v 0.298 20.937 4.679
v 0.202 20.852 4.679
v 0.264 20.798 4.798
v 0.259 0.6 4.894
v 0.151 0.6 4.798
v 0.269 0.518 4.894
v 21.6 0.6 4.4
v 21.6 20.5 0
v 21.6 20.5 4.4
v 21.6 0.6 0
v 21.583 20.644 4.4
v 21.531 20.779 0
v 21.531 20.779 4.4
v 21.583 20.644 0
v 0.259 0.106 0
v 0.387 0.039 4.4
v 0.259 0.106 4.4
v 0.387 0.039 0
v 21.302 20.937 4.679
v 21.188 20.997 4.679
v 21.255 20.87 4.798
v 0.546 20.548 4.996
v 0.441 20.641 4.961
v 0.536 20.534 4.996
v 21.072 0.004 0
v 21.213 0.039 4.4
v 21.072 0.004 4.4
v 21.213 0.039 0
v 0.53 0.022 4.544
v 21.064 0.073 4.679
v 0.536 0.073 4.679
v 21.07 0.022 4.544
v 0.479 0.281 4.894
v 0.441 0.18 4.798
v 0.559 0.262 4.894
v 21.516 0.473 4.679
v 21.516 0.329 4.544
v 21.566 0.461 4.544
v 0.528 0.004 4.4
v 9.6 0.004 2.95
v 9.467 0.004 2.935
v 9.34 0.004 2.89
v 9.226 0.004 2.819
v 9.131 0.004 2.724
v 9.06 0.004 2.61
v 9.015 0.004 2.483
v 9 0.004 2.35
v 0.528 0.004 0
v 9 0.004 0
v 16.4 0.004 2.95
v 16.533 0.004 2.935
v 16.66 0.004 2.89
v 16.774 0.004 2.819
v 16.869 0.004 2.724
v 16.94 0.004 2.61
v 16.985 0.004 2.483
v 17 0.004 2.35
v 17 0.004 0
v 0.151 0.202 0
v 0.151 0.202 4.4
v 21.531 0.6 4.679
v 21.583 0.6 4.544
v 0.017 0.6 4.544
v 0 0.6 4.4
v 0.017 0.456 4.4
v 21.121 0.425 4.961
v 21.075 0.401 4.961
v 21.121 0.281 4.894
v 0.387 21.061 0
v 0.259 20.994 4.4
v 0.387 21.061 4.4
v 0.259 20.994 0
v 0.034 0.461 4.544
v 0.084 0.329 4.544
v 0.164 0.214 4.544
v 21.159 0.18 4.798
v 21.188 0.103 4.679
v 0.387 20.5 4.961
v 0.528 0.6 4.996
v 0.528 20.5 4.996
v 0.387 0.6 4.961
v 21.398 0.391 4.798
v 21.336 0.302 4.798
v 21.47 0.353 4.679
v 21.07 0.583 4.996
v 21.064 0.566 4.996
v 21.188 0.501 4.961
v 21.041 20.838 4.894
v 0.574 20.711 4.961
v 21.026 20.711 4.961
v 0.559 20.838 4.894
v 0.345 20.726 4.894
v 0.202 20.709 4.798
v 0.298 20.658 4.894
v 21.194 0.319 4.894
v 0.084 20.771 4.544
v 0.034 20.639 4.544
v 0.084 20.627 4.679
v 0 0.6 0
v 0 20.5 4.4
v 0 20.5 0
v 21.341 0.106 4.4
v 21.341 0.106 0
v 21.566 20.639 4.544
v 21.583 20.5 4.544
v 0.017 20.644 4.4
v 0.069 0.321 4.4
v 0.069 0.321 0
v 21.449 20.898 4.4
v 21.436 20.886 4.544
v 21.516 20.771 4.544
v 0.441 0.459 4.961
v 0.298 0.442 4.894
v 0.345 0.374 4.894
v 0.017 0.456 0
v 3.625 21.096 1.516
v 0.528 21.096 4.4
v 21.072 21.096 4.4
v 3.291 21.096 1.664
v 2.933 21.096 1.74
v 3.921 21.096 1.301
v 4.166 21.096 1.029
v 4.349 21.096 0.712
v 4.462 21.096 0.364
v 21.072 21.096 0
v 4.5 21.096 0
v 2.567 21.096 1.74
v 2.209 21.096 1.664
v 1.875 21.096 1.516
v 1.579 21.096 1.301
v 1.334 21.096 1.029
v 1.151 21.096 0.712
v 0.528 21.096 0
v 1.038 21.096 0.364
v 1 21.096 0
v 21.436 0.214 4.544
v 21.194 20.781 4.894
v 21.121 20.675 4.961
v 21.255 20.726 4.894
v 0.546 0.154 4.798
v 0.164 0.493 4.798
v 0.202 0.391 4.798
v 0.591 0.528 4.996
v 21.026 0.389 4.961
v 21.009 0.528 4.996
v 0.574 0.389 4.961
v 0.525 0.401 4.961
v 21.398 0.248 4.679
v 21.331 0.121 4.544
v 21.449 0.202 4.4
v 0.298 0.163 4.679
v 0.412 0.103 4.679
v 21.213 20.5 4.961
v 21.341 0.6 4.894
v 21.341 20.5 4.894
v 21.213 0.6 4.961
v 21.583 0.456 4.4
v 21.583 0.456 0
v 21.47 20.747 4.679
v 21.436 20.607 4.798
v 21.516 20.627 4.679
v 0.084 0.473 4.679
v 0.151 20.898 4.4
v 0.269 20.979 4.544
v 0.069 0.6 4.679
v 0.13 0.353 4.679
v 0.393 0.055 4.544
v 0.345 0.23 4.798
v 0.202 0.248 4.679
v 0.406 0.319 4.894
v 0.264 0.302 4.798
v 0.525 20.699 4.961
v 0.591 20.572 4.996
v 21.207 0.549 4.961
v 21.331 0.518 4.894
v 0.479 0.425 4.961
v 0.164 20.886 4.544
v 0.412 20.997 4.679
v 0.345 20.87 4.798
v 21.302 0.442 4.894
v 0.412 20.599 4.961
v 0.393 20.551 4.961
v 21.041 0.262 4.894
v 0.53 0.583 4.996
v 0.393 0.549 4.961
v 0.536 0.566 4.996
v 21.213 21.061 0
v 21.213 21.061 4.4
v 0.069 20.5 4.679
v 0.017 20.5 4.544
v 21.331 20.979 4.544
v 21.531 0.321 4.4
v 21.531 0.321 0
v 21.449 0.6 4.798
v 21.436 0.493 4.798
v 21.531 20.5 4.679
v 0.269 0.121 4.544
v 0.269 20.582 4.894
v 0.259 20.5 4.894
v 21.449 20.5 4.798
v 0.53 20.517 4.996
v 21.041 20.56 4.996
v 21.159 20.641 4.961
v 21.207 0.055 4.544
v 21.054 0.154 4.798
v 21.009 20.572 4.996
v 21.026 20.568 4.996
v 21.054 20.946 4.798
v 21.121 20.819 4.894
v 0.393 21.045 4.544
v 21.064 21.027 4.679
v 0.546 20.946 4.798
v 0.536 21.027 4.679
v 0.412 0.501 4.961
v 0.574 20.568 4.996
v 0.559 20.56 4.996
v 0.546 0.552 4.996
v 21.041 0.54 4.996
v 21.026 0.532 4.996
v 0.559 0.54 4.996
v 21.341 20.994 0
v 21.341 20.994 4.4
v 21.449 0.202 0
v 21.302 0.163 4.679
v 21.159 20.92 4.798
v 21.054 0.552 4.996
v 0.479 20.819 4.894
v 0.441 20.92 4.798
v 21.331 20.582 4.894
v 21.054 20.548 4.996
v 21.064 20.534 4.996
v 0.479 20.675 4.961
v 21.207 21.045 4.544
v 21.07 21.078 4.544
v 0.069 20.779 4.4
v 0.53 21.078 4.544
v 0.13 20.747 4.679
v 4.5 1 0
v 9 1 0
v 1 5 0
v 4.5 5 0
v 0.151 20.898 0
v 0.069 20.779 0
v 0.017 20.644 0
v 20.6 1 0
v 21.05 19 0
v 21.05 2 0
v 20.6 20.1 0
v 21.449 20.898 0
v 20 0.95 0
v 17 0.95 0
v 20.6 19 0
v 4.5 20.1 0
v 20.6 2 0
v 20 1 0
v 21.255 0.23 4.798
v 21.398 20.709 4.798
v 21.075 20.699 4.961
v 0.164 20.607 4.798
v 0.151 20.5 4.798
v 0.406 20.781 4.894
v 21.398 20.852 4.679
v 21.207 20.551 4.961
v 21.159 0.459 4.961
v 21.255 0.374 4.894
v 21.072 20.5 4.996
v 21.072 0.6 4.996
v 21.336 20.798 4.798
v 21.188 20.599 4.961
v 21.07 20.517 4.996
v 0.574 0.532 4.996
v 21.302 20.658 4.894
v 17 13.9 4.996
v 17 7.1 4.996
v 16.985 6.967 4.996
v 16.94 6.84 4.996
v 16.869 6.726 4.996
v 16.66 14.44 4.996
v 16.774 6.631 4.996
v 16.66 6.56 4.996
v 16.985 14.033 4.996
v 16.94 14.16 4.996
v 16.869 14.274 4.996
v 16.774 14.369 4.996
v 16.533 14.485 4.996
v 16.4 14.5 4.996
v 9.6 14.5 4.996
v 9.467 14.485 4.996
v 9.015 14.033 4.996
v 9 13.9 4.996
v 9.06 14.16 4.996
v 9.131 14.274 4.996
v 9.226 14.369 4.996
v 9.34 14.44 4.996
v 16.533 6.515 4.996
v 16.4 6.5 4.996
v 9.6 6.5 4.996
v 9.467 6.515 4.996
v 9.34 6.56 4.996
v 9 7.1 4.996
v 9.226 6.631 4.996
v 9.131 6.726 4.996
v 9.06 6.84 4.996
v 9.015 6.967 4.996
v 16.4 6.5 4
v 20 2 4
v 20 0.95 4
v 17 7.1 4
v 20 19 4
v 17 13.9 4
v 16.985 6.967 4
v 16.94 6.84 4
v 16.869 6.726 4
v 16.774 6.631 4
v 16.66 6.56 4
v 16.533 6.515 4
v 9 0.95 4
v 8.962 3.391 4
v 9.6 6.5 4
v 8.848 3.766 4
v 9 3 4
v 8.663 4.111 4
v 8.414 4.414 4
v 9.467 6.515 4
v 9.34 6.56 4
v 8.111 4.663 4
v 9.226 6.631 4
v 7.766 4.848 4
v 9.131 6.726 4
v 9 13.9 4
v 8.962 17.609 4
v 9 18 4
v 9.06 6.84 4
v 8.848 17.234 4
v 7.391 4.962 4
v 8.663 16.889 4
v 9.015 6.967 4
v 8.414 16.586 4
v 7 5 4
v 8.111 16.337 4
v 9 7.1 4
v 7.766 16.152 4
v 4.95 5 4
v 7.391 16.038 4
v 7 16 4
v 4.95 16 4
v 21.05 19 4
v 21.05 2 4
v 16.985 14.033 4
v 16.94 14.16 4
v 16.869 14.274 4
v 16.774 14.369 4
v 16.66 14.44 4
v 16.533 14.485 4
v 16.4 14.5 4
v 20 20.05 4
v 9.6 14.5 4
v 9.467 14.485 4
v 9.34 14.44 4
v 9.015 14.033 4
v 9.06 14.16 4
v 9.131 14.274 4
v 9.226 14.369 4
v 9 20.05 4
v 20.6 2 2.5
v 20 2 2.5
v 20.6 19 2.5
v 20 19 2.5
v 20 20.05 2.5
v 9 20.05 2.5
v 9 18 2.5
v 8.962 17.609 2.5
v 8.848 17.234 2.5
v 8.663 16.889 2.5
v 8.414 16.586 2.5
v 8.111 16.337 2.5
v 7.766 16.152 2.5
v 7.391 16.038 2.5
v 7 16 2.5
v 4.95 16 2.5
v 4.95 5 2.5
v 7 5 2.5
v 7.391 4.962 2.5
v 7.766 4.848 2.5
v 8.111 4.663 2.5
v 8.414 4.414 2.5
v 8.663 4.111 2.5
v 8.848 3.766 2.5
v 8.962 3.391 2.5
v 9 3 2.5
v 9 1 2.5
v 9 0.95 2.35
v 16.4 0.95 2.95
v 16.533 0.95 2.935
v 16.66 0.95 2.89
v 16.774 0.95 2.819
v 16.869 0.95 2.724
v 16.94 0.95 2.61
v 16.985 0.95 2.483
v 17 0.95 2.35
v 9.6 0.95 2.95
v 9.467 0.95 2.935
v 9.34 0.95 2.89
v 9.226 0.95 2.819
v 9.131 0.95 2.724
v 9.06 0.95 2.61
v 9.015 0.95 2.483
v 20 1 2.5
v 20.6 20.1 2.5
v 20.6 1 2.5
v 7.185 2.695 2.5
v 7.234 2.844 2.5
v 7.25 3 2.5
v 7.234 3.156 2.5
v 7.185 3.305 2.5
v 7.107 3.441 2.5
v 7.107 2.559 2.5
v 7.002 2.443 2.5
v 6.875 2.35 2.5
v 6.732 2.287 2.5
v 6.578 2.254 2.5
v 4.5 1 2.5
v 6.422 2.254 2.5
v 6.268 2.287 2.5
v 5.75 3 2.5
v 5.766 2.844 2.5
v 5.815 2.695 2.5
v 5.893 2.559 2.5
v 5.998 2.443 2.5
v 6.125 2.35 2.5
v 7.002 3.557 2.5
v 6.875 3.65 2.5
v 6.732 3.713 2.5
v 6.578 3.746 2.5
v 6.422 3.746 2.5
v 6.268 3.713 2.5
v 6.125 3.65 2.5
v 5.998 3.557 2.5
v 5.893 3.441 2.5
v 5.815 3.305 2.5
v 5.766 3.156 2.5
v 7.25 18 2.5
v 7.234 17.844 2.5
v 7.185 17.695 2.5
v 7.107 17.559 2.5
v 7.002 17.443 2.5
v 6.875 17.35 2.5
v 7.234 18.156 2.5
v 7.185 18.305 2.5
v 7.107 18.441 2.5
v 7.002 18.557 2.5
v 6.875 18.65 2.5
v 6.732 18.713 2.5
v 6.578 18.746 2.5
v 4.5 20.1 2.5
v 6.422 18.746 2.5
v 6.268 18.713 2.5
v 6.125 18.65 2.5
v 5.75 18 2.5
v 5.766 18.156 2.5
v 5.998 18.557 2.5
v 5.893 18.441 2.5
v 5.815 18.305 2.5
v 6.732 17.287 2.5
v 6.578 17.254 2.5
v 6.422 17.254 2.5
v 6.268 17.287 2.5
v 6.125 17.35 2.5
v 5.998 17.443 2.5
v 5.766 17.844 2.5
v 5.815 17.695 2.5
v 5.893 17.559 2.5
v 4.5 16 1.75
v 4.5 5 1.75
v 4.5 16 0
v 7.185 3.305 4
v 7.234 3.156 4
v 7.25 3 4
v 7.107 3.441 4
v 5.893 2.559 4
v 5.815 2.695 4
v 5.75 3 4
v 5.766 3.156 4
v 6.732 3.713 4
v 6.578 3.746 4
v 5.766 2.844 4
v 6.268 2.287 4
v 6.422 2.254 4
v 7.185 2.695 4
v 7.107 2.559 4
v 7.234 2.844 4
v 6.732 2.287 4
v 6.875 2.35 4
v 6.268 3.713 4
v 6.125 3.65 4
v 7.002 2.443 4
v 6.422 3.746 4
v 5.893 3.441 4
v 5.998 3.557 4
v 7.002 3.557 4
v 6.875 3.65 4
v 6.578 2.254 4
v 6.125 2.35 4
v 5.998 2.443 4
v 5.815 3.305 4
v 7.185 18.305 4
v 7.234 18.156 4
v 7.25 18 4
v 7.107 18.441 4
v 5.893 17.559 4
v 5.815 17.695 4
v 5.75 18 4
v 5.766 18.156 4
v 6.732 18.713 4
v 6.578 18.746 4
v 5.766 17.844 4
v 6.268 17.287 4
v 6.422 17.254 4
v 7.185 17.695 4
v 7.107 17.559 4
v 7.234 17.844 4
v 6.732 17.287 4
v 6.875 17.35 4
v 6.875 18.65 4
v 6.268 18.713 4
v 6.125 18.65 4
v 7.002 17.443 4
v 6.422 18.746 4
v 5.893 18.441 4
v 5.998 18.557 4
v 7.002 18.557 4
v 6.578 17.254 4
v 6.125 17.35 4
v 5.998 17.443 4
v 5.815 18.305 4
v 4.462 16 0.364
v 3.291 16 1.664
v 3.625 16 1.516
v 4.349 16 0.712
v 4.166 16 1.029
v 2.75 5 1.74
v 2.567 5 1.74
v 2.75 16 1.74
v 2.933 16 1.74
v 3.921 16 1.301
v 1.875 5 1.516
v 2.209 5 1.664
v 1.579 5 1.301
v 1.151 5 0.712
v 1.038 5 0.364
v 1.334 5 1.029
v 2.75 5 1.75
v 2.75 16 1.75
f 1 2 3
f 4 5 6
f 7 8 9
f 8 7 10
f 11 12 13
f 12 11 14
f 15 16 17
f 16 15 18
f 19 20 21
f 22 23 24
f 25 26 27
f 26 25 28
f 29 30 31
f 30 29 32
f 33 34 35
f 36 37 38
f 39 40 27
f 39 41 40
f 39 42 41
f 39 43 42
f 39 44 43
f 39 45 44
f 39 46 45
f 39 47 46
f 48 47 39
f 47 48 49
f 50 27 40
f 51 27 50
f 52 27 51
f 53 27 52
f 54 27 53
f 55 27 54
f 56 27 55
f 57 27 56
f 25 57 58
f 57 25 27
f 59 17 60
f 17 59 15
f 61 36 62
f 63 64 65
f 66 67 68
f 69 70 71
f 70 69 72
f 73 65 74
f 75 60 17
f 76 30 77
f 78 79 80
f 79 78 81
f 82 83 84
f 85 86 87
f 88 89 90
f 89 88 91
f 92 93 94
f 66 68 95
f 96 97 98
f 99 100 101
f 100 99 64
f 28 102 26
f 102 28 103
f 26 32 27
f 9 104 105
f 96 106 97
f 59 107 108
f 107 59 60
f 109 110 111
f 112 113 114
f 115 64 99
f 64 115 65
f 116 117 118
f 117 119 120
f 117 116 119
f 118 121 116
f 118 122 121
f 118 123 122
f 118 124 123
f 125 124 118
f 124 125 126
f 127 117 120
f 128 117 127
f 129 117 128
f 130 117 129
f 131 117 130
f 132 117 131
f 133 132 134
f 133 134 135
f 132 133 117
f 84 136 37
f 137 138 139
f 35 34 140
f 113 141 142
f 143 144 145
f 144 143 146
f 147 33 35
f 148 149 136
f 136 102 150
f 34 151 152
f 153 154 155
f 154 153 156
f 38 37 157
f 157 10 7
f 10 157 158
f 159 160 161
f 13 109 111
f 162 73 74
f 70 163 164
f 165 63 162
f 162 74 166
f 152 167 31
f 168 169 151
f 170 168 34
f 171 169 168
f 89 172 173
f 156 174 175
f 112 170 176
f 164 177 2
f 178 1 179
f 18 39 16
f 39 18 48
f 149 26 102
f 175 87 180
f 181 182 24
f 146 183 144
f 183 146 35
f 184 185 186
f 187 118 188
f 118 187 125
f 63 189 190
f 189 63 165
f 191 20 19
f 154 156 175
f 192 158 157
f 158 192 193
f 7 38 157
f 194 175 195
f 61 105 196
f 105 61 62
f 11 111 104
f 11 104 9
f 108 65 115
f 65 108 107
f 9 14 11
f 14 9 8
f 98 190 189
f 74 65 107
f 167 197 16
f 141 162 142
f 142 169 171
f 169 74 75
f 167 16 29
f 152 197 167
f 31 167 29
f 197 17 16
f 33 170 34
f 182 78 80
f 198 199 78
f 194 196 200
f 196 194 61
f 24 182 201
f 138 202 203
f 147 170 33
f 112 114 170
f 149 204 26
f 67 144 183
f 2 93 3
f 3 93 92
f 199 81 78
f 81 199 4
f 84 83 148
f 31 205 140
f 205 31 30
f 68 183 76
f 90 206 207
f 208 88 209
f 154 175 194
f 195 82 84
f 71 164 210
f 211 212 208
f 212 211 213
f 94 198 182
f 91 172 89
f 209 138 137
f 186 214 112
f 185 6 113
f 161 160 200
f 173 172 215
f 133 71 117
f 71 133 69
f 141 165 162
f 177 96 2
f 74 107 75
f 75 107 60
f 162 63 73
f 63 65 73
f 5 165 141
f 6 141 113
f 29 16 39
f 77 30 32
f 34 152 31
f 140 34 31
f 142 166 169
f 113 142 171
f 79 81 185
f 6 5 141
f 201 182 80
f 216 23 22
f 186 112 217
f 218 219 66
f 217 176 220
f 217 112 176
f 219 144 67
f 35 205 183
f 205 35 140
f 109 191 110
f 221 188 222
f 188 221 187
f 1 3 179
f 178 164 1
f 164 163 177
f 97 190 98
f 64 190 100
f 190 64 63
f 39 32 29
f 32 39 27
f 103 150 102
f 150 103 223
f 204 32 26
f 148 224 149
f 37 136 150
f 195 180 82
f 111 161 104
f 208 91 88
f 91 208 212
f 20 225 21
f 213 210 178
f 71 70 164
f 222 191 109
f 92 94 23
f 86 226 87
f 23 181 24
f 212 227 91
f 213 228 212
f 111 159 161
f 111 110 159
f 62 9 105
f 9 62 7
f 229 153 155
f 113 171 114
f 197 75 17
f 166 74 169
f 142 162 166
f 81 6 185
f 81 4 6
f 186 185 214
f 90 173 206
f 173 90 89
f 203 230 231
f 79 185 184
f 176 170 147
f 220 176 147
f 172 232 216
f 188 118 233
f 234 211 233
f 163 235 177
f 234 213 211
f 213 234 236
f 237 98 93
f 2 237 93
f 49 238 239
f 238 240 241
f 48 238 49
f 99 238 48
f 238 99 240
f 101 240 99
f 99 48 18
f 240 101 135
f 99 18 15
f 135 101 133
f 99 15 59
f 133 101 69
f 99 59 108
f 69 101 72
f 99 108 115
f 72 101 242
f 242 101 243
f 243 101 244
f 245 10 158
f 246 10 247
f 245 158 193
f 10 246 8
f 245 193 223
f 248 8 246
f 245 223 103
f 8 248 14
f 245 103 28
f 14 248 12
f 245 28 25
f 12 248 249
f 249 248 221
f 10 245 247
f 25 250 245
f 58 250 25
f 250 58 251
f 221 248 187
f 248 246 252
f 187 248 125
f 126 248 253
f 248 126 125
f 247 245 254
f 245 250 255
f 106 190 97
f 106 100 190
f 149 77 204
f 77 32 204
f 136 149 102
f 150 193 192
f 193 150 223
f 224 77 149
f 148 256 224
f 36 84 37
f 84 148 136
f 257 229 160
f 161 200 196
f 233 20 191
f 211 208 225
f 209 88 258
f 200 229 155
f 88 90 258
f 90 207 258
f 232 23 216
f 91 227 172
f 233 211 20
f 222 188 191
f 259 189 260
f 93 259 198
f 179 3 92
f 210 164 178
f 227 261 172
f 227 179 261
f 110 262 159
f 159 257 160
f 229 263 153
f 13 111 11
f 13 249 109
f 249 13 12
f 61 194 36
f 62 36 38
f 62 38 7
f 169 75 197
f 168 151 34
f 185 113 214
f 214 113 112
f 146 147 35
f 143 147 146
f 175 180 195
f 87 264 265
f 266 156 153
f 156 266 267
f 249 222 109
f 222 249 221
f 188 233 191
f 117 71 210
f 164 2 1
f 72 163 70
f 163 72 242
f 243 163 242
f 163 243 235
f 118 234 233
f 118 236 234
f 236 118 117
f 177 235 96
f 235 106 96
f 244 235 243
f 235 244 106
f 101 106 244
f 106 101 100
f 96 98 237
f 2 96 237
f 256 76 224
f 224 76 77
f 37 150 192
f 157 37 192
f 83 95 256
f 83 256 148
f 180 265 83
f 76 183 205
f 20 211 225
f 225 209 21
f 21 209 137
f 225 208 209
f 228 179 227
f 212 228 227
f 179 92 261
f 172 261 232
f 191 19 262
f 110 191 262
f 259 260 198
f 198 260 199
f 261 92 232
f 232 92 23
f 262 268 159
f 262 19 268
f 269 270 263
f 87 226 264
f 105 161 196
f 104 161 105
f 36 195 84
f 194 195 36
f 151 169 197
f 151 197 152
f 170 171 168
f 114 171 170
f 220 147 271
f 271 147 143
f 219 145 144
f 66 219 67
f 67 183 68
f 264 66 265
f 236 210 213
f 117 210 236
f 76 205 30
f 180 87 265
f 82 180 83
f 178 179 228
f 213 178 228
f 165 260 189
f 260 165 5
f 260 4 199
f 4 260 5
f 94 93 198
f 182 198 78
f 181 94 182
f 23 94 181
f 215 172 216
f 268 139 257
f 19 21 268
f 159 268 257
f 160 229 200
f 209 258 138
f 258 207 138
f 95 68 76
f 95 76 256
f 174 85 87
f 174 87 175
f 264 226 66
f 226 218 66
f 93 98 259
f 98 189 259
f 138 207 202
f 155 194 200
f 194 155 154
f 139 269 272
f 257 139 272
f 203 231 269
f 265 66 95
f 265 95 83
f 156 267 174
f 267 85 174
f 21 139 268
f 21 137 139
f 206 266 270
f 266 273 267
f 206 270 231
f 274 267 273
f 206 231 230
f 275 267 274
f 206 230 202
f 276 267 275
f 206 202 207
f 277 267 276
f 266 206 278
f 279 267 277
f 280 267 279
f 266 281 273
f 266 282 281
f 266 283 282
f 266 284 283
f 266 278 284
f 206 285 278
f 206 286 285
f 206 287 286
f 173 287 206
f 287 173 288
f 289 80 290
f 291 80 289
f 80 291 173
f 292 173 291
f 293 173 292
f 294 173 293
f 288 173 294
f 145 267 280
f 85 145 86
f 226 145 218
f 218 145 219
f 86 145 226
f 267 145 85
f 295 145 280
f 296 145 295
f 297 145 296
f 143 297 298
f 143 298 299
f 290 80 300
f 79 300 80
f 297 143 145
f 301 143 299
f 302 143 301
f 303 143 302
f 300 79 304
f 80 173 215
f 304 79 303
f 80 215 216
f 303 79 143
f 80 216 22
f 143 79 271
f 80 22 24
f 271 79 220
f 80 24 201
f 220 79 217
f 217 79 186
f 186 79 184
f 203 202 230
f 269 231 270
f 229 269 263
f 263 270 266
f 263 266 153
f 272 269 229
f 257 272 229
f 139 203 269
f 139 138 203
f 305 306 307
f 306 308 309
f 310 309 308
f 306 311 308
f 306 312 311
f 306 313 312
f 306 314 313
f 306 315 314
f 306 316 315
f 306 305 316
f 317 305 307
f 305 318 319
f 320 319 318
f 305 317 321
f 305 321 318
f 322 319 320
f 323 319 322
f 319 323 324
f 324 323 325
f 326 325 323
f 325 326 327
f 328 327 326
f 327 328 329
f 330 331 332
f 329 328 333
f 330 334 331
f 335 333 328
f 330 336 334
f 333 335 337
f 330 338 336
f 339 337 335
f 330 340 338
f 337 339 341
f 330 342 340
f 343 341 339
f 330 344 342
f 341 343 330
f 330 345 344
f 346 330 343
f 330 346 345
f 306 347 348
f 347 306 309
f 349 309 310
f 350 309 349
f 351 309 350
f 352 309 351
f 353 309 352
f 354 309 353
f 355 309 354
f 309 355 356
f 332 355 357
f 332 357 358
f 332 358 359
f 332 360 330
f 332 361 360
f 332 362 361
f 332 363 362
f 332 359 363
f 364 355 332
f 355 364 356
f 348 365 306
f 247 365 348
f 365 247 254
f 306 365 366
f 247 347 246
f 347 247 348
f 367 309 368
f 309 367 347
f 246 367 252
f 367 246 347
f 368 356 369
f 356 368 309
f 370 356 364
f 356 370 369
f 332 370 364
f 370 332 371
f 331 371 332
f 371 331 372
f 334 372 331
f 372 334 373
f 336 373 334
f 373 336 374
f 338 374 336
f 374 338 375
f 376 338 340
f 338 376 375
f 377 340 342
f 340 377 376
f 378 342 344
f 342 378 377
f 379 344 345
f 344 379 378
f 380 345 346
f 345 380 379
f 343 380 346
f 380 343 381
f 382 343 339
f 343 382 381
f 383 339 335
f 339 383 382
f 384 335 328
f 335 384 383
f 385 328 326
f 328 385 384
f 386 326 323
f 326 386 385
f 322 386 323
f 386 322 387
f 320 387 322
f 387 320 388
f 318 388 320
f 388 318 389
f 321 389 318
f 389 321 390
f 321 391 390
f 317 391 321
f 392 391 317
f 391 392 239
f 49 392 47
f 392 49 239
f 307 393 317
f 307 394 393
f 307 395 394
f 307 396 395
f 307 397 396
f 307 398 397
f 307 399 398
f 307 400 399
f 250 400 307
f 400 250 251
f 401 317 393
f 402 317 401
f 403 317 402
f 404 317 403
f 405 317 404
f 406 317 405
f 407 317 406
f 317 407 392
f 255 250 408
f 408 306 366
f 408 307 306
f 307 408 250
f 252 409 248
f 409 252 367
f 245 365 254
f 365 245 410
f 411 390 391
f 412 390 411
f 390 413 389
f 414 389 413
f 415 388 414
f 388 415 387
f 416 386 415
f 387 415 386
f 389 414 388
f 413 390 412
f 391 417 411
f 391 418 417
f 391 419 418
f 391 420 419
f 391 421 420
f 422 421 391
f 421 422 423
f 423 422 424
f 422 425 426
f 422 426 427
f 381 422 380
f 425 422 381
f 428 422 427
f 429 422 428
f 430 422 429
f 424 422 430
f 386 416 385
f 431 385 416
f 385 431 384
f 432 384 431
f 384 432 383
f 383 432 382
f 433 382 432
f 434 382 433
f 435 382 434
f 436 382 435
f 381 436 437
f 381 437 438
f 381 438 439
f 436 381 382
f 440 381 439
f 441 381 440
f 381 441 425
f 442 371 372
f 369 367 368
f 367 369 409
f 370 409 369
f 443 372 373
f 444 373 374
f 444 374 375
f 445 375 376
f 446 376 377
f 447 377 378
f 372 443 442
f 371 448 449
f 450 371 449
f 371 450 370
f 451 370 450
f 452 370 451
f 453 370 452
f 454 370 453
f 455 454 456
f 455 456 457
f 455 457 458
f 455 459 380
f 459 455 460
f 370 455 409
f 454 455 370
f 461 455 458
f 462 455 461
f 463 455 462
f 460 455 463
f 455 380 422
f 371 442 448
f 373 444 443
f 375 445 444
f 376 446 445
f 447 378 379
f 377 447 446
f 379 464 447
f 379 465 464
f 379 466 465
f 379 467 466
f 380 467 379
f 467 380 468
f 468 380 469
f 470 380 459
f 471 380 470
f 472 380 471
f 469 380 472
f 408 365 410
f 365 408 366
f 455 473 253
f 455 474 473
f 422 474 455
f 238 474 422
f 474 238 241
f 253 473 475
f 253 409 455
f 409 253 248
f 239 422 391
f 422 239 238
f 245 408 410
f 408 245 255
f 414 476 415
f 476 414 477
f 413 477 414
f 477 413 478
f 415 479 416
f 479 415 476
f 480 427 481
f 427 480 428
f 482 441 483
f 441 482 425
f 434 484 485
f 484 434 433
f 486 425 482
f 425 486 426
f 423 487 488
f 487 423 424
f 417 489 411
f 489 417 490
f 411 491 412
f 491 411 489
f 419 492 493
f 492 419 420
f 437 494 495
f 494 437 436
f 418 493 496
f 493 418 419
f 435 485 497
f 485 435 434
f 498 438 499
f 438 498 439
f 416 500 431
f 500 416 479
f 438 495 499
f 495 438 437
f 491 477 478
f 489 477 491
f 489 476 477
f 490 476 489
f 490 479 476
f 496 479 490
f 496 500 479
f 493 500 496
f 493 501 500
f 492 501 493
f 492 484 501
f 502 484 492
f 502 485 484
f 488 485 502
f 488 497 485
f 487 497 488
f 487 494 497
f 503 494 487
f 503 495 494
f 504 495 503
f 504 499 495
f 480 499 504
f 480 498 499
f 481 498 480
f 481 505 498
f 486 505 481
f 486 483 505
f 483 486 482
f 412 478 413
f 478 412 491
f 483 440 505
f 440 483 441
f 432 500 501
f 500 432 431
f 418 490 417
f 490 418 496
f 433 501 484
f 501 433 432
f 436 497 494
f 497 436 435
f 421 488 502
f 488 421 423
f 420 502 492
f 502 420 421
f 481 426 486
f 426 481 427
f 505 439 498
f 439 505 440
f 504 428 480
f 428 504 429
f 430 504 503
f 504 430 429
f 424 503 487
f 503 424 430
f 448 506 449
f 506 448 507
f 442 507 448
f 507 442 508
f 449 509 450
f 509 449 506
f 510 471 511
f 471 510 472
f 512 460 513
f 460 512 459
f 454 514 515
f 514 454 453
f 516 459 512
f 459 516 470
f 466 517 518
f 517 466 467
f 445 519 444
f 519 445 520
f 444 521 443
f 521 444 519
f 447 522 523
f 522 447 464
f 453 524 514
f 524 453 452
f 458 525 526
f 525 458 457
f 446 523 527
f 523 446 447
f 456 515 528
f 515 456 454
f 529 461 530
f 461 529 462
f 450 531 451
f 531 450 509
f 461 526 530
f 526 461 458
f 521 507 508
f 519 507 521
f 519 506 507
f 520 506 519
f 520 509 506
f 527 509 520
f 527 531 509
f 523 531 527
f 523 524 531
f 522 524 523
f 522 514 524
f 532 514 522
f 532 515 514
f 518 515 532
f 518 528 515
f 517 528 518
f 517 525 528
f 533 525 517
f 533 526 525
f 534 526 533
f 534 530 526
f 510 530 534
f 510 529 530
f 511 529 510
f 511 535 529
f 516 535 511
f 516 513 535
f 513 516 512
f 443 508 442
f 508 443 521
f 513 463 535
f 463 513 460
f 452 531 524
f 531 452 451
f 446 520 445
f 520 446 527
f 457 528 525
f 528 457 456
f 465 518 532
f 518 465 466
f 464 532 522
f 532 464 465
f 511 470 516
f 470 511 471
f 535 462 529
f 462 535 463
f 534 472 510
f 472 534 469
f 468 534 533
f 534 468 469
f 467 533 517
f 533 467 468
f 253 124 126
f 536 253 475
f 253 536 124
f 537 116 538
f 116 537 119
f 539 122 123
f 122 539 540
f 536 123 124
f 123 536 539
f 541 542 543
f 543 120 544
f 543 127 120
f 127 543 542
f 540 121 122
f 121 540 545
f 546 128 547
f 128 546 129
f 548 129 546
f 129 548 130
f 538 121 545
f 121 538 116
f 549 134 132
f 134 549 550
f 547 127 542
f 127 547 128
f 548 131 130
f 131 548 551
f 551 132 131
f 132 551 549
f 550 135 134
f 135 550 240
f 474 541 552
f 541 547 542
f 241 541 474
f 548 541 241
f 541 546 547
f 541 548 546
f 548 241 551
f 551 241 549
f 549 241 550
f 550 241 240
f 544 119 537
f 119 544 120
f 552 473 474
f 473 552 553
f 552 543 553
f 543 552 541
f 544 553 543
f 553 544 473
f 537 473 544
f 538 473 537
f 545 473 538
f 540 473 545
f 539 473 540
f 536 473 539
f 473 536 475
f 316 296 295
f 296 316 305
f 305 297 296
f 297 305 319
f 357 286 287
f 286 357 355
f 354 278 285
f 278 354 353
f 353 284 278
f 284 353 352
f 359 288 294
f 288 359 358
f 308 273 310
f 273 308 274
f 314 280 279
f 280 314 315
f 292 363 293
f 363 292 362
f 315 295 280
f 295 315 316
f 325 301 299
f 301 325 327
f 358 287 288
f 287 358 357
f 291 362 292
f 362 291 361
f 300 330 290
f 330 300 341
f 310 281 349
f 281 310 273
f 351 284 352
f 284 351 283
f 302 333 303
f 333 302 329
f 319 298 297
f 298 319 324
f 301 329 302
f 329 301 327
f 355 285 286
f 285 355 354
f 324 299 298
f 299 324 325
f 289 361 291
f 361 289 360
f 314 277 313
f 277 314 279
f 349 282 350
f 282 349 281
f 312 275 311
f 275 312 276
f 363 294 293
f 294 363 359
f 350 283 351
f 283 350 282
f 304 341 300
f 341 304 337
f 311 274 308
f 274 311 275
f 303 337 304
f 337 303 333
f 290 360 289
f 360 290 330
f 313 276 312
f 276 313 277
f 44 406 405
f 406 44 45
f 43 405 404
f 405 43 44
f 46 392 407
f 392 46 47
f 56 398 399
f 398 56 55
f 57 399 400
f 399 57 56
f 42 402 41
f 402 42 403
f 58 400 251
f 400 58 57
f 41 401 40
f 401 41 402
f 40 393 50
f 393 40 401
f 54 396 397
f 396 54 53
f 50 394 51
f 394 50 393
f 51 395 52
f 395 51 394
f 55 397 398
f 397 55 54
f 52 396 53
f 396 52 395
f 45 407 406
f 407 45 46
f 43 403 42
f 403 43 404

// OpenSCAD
// file: roundedcube.scad
/* https://danielupshaw.com/openscad-rounded-corners/ */

module roundedcube(size = [1, 1, 1], center = false, radius = 0.5, apply_to = "all")
{
	// If single value, convert to [x, y, z] vector
	size = (size[0] == undef) ? [size, size, size] : size;

	translate_min = radius;
	translate_xmax = size[0] - radius;
	translate_ymax = size[1] - radius;
	translate_zmax = size[2] - radius;

	diameter = radius * 2;

	obj_translate = (center == false) ?
		[0, 0, 0] : [
			-(size[0] / 2),
			-(size[1] / 2),
			-(size[2] / 2)
		];

	translate(v = obj_translate) {
		hull() {
			for (translate_x = [translate_min, translate_xmax]) {
				x_at = (translate_x == translate_min) ? "min" : "max";
				for (translate_y = [translate_min, translate_ymax]) {
					y_at = (translate_y == translate_min) ? "min" : "max";
					for (translate_z = [translate_min, translate_zmax]) {
						z_at = (translate_z == translate_min) ? "min" : "max";

						translate(v = [translate_x, translate_y, translate_z])
						if (
							(apply_to == "all") ||
							(apply_to == "xmin" && x_at == "min") || (apply_to == "xmax" && x_at == "max") ||
							(apply_to == "ymin" && y_at == "min") || (apply_to == "ymax" && y_at == "max") ||
							(apply_to == "zmin" && z_at == "min") || (apply_to == "zmax" && z_at == "max")
						) {
							sphere(r = radius);
						} else {
							rotate = 
								(apply_to == "xmin" || apply_to == "xmax" || apply_to == "x") ? [0, 90, 0] : (
								(apply_to == "ymin" || apply_to == "ymax" || apply_to == "y") ? [90, 90, 0] :
								[0, 0, 0]
							);
							rotate(a = rotate)
							cylinder(h = diameter, r = radius, center = true);
						}
					}
				}
			}
		}
	}
}
// file: params.scad
x_board=16.1;
y_board=19.1;
z_board=1;
d_cable=3.5;
ep_box=1;

x_box=x_board+d_cable+ep_box*2;
y_box=y_board+ep_box*2;
z_box=8;
z_cover=5;
z_base=z_box-z_cover;
// main file
$fs = 0.15;

include <params.scad>
include <roundedcube.scad>

difference() {
     roundedcube([x_box, y_box, z_cover], false, 0.6, "zmax");
     /* hole for board */
     translate([0, 0, 0]) linear_extrude(height = z_cover - ep_box) import("board.dxf", layer="hole_board");
     translate([d_cable+ep_box, ep_box, -1]) cube([x_board, y_board, z_cover/2+1]);
     /* hole for screws */
     translate([d_cable+ep_box+2, ep_box+2, 0]) cylinder(d=1.5,h=z_cover - ep_box);
     translate([d_cable+ep_box+2, ep_box+2+15, 0]) cylinder(d=1.5,h=z_cover - ep_box);
     /* hole for cable */
     translate([d_cable/2+ep_box, ep_box+4, 0]) rotate([-90, 0, 0]) cylinder(d=d_cable, h=y_box+1);
     translate([d_cable/2+ep_box, ep_box+4, 0]) cube([d_cable, 11, d_cable/2]);
     /* holes for air */
     translate([0, 0, 0]) linear_extrude(height = z_cover + 1) import("board.dxf", layer="hole");
     translate([0, ep_box+1, -y_box/2-4+3]) rotate([90, 0, 0]) linear_extrude(height = y_box/2 + 1) import("board.dxf", layer="hole");

};
